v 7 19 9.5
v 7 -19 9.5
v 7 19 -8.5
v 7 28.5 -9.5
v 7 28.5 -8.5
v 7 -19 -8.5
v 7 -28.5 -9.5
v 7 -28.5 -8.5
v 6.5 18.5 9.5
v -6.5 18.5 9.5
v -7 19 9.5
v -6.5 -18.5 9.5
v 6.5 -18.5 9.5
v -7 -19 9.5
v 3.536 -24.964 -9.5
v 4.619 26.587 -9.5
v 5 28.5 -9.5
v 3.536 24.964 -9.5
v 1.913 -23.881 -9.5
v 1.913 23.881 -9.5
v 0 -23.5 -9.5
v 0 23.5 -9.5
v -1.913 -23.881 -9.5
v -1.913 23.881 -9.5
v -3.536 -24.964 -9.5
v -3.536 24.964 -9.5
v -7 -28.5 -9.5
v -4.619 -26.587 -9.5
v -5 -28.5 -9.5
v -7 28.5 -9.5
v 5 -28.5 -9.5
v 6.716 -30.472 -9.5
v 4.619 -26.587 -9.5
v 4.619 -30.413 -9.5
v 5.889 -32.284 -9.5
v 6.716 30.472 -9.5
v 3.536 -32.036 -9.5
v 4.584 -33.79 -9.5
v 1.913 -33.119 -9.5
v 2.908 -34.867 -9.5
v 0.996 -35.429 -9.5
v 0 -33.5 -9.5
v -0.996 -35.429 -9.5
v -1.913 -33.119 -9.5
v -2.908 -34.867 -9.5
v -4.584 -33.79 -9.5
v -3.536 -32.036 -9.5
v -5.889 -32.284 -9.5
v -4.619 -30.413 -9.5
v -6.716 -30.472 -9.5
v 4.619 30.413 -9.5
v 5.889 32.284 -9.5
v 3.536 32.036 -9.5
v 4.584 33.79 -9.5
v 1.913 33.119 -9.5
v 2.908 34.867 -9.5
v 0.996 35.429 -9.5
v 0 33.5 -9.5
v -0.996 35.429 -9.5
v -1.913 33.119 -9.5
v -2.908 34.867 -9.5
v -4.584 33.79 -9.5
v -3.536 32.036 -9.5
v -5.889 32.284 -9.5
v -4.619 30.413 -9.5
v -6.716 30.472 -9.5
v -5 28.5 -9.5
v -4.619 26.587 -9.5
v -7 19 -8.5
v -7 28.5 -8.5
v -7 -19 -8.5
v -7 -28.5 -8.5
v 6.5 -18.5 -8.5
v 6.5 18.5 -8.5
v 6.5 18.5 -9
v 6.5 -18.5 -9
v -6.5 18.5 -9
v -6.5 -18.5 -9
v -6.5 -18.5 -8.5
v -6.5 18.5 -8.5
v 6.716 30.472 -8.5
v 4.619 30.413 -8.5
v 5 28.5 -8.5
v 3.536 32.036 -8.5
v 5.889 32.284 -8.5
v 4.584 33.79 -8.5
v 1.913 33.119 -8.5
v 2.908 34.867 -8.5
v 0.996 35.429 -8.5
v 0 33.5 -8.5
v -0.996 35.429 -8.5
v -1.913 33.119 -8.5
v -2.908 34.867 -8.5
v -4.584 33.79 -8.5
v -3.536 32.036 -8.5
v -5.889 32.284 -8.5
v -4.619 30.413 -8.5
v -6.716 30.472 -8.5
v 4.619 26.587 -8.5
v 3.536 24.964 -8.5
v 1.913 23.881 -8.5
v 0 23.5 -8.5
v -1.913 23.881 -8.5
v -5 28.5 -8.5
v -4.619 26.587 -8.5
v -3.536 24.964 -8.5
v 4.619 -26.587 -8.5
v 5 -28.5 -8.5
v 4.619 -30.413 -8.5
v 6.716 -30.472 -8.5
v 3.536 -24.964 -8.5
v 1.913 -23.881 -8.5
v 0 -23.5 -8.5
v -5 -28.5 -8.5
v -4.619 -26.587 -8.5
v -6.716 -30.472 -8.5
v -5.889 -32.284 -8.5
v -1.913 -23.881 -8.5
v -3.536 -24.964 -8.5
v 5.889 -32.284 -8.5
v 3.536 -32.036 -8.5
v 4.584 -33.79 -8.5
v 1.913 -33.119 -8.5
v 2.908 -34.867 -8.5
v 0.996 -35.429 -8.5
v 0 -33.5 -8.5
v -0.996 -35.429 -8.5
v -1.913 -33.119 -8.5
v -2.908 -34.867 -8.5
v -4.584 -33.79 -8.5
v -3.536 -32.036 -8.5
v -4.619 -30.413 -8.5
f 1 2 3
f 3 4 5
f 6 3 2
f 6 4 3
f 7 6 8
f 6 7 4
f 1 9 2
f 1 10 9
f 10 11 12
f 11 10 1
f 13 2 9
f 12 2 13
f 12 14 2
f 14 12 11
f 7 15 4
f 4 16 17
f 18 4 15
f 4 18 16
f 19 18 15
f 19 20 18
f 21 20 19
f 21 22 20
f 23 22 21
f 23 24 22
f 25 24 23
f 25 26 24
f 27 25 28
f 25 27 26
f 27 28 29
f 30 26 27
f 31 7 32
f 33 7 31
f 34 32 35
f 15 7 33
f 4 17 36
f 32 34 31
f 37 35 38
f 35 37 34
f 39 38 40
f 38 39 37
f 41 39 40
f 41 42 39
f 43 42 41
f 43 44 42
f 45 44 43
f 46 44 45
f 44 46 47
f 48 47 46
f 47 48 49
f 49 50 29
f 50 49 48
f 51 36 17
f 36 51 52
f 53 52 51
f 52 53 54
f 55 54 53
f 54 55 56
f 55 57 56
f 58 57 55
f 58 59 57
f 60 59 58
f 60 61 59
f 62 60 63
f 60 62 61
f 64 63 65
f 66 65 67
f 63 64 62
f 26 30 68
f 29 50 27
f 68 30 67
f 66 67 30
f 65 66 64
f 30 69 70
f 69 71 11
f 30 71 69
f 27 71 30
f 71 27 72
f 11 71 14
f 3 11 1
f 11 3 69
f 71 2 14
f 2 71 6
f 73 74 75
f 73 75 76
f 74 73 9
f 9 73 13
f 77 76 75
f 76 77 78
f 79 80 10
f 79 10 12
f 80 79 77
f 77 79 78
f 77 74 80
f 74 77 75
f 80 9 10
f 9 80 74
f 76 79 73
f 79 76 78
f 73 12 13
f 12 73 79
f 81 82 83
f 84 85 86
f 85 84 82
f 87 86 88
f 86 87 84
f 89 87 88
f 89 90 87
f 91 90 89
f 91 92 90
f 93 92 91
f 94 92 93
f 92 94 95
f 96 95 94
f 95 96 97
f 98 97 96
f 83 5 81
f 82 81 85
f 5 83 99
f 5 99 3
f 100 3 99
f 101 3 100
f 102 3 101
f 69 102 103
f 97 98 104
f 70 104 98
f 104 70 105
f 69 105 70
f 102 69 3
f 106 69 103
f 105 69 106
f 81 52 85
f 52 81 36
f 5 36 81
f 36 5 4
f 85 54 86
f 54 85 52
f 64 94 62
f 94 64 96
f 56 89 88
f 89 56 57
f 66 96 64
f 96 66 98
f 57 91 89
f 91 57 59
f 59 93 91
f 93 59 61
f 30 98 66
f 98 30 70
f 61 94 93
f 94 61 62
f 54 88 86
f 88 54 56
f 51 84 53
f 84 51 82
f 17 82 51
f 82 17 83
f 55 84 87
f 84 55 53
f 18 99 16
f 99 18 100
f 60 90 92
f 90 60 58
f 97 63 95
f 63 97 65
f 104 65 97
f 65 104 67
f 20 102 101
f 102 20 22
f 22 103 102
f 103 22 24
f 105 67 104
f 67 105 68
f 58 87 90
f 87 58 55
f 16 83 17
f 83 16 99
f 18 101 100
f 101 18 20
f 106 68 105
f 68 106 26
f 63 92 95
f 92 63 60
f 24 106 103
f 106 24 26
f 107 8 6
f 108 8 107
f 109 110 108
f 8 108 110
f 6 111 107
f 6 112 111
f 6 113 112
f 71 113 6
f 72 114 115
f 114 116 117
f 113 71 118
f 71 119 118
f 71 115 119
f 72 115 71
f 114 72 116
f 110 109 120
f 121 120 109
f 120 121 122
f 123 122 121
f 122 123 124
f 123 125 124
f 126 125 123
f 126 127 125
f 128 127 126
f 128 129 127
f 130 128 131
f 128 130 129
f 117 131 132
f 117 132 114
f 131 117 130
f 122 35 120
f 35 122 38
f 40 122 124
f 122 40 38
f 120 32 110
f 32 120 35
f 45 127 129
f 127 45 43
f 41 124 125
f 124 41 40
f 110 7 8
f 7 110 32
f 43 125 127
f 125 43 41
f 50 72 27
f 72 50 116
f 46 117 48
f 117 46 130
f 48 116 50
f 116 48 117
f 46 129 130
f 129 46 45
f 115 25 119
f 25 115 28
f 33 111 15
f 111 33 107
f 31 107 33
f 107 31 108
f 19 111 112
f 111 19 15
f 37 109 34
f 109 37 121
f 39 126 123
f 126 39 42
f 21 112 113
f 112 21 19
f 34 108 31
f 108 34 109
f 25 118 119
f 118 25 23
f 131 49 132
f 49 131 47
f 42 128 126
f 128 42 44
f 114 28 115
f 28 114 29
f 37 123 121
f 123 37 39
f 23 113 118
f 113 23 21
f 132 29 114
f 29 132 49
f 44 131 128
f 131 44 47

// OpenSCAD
ancho=13;
alto=19;
largo=37;
e=1;
oreja=10;
orificio=10;
difference(){

cube([ancho+e,largo+e,alto], center=true);
translate([0,0,e])cube([ancho,largo,alto+e],center=true);
};
difference(){
union(){
translate([0,largo/2+oreja/2,-alto/2+e/2])cube([ancho+e,oreja,e],center=true);
translate([0,largo/2+oreja,-alto/2+e/2])cylinder(h=e,d=ancho+e,center=true);}
    
translate([0,largo/2+oreja,-alto/2+e/2])cylinder(h=2*e,d=orificio,center=true);};
difference(){
union(){
translate([0,-largo/2-oreja/2,-alto/2+e/2])cube([ancho+e,oreja,e],center=true);
translate([0,-largo/2-oreja,-alto/2+e/2])cylinder(h=e,d=ancho+e,center=true);}
translate([0,-largo/2-oreja,-alto/2+e/2])cylinder(h=2*e,d=orificio,center=true);}
